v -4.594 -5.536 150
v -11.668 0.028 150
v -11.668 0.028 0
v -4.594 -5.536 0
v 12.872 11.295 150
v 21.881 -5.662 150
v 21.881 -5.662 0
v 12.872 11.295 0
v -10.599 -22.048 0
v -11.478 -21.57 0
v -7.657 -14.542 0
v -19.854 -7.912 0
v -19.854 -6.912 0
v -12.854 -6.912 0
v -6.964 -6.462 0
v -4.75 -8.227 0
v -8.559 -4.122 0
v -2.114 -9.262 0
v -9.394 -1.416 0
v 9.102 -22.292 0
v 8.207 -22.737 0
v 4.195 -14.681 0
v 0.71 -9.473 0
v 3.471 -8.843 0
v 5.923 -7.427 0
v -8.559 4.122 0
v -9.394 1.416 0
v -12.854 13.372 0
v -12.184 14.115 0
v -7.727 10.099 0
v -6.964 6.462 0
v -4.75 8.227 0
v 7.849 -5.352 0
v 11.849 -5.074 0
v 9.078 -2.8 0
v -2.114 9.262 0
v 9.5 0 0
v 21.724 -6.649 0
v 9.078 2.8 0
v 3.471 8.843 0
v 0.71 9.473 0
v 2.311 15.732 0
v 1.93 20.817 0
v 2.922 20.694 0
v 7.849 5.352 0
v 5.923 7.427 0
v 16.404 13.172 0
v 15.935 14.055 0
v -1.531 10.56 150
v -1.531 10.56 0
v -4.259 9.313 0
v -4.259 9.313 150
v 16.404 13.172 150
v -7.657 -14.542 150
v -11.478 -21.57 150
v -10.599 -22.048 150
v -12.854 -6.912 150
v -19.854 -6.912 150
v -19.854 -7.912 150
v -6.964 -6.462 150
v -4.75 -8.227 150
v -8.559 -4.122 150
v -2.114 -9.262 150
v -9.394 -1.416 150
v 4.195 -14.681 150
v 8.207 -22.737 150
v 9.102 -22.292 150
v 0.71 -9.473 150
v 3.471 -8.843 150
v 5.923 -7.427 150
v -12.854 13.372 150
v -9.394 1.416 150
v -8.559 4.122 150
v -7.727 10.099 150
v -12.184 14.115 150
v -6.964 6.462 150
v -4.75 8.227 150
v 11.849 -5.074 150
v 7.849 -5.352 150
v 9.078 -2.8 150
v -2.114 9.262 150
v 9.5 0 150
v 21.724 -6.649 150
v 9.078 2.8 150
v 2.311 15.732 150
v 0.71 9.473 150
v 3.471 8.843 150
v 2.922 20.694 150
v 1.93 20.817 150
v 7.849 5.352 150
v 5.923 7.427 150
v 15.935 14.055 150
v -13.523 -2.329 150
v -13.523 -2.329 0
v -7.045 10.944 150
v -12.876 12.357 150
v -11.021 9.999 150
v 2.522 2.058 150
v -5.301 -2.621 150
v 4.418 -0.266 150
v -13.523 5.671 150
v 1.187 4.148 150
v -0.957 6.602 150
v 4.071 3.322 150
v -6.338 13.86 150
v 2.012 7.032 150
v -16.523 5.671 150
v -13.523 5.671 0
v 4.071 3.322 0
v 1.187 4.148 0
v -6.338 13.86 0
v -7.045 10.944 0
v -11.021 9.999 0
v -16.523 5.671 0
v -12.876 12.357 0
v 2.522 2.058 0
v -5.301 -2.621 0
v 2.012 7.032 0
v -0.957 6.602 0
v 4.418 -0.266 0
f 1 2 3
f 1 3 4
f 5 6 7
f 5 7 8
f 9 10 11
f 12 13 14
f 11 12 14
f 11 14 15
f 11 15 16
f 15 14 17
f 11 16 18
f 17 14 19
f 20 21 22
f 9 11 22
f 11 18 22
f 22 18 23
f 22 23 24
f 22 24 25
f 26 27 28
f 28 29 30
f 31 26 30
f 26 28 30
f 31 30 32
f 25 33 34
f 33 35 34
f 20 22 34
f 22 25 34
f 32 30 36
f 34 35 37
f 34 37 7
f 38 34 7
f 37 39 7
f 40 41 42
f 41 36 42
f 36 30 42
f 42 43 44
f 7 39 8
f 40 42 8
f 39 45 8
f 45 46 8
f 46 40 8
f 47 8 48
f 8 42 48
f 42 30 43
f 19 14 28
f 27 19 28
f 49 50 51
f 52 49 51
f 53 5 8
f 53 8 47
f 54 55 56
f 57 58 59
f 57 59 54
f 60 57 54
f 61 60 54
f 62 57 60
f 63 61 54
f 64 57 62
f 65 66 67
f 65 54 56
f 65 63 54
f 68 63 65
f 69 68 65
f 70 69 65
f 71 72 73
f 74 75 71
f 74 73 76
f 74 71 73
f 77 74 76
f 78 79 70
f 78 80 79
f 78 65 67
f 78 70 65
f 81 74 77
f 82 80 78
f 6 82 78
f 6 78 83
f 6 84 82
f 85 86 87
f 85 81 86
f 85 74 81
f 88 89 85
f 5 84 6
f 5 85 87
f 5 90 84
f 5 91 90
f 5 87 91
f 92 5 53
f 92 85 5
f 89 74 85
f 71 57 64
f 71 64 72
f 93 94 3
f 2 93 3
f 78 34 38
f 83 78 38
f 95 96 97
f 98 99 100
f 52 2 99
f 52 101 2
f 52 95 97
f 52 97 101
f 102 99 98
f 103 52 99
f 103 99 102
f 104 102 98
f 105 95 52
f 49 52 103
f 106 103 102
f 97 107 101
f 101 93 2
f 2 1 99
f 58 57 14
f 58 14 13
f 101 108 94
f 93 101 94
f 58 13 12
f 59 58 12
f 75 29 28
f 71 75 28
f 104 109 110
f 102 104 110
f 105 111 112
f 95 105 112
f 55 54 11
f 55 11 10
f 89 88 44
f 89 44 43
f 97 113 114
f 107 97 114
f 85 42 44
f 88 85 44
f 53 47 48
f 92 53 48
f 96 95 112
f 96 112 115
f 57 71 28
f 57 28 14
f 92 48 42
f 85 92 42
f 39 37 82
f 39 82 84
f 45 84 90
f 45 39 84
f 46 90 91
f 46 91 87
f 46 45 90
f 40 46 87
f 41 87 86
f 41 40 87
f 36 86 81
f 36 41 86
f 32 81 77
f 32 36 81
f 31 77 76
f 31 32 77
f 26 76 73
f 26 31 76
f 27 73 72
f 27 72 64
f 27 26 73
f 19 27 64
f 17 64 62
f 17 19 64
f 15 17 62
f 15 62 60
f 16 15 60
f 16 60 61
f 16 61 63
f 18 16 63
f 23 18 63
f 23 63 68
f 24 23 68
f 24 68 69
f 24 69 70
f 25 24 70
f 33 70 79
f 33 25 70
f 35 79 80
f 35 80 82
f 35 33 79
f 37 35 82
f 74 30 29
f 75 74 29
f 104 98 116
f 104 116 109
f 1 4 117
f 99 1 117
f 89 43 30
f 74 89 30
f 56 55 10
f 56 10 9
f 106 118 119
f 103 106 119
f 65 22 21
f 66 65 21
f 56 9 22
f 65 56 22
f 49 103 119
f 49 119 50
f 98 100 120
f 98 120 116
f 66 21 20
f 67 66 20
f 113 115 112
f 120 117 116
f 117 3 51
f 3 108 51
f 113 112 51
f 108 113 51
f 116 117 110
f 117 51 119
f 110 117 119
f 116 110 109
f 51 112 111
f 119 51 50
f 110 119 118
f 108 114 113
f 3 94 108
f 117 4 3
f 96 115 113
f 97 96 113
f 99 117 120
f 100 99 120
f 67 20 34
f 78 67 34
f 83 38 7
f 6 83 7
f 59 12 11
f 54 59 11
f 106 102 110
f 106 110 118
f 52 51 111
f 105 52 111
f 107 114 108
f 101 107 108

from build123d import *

# Parameters (mm, degrees)
PAD_DEPTH    = 150
SKETCH001_R  = 9.5
PAD001_DEPTH = 150


with BuildPart() as body:
    # Sketch (on XY_Plane of Origin) → Pad (new body)
    with BuildSketch(Plane.XY):
        Polygon((2.521598, 2.057901), (4.071085, 3.322453), (1.186838, 4.147752), (2.012136, 7.031999), (-0.956841, 6.601678), (-1.530602, 10.560314), (-4.258844, 9.312638), (-6.338304, 13.859708), (-7.044561, 10.944026), (-12.875925, 12.356541), (-11.021036, 9.998706), (-16.522651, 5.670631), (-13.522651, 5.670631), (-13.522651, -2.329369), (-11.667762, 0.028466), (-4.594257, -5.536202), (-5.300514, -2.62052), (4.418426, -0.266329), align=None)
    extrude(amount=PAD_DEPTH)


with BuildPart() as corps:
    # Sketch001 (on XY_Plane001 of Origin002) → Pad001 (new body)
    with BuildSketch(Plane.XY):
        Polygon((12.871546, 11.295163), (16.403886, 13.172015), (15.934673, 14.0551), (2.311261, 15.731894), (2.92206, 20.694446), (1.92955, 20.816606), (-7.72675, 10.098511), (-12.184443, 14.1146), (-12.853792, 13.371651), (-12.853792, -6.911691), (-19.853792, -6.911691), (-19.853792, -7.911691), (-7.657095, -14.54171), (-11.477816, -21.570373), (-10.599233, -22.047963), (4.195006, -14.680891), (8.206833, -22.737271), (9.101986, -22.291512), (11.848638, -5.073887), (21.723775, -6.649224), (21.881308, -5.66171), align=None)
        Circle(SKETCH001_R, mode=Mode.SUBTRACT)
    extrude(amount=PAD001_DEPTH)


solid = Compound([body.part, corps.part])
